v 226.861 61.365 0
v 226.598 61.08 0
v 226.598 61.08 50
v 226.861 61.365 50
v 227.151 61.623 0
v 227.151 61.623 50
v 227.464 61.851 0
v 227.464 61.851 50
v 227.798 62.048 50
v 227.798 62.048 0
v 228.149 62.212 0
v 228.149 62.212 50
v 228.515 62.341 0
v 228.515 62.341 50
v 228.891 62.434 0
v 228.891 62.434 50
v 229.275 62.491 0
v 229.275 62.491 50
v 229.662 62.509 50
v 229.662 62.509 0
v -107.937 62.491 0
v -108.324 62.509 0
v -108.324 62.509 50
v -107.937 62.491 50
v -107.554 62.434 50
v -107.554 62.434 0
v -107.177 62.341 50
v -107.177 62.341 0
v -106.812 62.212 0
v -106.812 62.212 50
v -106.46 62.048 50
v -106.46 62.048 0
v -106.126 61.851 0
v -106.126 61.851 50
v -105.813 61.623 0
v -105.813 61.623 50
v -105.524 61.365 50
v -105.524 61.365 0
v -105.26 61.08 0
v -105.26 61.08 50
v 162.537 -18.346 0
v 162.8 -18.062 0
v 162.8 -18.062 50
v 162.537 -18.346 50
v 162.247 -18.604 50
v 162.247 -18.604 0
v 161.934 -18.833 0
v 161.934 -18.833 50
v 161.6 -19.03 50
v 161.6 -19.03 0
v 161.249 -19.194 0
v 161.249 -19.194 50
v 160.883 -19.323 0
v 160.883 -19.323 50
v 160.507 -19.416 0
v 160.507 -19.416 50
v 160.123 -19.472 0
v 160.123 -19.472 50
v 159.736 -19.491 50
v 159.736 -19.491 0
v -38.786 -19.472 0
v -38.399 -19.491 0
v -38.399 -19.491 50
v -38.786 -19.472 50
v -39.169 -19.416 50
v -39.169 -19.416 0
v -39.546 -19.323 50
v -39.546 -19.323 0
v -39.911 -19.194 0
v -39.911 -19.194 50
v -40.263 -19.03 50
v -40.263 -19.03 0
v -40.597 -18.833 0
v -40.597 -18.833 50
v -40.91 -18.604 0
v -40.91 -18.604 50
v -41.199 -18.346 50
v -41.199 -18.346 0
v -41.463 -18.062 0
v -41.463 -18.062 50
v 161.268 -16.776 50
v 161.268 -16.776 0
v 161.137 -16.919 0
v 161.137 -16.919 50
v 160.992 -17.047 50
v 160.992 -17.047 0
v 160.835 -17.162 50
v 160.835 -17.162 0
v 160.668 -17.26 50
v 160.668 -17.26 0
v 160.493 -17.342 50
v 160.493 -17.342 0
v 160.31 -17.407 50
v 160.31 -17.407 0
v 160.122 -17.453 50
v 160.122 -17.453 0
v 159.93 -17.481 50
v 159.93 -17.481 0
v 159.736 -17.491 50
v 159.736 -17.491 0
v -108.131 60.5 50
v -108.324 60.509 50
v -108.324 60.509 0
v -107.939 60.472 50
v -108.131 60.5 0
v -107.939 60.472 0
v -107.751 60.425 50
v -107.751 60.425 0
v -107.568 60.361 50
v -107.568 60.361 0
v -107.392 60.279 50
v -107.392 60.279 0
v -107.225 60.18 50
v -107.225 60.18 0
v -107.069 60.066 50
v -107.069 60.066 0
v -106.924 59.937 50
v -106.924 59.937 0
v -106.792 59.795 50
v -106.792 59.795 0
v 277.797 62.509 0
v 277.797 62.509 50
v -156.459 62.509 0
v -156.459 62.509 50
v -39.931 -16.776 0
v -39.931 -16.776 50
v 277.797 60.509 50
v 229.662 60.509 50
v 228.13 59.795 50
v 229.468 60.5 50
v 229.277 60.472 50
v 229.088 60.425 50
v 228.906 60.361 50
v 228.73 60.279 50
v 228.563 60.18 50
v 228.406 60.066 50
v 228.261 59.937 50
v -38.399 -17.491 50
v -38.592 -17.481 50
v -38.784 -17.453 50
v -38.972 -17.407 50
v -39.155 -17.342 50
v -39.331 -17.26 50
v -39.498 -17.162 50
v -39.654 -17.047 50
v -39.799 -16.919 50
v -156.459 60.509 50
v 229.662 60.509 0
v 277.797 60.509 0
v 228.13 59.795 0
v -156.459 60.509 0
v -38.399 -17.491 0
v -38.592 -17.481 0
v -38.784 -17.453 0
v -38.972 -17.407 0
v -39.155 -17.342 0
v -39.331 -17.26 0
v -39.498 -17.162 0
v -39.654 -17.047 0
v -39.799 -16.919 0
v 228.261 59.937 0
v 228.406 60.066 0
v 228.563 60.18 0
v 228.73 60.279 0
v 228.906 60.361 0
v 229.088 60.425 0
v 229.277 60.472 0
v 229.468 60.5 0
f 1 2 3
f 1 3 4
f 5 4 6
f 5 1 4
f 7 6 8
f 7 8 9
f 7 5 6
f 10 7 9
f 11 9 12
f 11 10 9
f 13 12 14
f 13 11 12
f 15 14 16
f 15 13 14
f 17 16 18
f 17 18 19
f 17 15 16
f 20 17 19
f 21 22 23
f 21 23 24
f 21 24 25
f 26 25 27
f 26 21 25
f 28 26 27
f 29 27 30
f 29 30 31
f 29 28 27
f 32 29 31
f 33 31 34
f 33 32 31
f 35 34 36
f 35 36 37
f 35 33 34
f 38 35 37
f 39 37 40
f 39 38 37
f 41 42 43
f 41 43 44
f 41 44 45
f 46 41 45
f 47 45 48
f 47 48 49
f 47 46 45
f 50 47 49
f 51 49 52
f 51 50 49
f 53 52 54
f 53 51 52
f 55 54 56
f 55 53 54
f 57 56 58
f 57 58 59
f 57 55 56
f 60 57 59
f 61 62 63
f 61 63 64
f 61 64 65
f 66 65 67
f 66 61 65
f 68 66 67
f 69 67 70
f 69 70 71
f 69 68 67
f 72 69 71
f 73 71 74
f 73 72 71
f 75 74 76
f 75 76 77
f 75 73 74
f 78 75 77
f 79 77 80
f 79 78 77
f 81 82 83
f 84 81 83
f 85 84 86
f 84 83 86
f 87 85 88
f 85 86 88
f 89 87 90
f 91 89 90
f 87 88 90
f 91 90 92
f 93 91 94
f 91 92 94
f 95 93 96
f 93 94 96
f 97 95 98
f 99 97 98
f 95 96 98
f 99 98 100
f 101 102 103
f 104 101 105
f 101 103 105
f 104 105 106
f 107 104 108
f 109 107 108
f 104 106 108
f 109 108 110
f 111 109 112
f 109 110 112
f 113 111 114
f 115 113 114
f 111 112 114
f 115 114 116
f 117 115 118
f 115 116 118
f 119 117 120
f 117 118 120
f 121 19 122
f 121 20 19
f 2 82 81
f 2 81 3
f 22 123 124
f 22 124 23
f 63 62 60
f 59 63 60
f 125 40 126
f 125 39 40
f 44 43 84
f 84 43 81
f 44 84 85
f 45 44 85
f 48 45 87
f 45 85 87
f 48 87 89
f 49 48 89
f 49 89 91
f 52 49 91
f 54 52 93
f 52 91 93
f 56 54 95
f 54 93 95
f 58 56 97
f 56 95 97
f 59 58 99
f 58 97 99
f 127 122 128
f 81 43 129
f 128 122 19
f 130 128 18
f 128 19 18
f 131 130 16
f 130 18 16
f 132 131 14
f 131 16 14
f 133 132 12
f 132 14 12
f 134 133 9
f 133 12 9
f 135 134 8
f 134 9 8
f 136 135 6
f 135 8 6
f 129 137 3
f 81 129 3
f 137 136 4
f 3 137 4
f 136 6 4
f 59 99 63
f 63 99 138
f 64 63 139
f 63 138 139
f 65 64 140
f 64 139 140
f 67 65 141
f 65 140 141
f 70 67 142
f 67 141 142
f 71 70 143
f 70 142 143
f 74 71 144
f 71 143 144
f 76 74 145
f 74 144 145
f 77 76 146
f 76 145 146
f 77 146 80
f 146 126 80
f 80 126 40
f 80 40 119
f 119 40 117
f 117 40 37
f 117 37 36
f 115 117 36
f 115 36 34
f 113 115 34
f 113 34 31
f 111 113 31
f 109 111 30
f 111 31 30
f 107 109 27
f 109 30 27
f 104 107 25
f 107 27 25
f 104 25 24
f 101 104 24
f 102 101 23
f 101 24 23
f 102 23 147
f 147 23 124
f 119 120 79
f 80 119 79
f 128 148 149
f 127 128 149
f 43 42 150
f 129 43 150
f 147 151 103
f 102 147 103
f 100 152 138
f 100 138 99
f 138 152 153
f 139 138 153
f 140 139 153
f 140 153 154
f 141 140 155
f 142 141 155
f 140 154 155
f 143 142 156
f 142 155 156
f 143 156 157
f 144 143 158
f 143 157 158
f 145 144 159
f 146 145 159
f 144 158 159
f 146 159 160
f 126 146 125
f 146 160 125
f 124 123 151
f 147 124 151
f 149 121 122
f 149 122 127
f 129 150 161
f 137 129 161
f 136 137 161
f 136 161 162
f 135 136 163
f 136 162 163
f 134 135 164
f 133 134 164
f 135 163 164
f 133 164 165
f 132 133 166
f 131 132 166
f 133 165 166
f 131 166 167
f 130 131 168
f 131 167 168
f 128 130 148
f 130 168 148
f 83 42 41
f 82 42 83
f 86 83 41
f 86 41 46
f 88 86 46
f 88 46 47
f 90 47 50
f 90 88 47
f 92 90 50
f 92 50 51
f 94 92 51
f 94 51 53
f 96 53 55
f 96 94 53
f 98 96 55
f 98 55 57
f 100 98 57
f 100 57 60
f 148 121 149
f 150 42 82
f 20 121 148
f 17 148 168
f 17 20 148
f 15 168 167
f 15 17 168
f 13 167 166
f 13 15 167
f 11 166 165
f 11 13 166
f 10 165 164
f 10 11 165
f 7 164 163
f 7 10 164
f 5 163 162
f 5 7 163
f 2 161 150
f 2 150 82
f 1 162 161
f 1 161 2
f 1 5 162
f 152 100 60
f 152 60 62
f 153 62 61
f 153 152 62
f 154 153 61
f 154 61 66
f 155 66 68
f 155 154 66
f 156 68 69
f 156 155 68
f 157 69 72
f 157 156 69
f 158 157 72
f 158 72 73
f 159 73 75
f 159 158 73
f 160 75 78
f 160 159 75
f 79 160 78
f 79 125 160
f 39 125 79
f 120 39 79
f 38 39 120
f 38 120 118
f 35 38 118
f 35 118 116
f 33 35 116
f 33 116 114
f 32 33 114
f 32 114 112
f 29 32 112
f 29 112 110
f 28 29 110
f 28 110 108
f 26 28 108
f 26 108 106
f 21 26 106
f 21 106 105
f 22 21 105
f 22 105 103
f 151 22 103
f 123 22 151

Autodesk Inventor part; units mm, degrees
ref_plane "YZ Plane" through (0, 0, 0) normal (1, 0, 0) x (0, 1, 0)
ref_plane "XZ Plane" through (0, 0, 0) normal (0, 1, 0) x (-1, 0, 0)
ref_plane "XY Plane" through (0, 0, 0) normal (0, 0, 1) x (1, 0, 0)
sketch "Sketch3" plane through (0, 0, 0) normal (0, 0, 1) x (1, 0, 0)
  line L0 (-156.4592, 62.5093) -> (-106.4592, 62.5093)
  line L1 (-106.4592, 62.5093) -> (-39.3312, -17.4907)
  line L2 (-39.3312, -17.4907) -> (160.6688, -17.4907)
  line L3 (160.6688, -17.4907) -> (227.7967, 62.5093)
  line L4 (227.7967, 62.5093) -> (277.7967, 62.5093)
  point P0 (0, 0)
  dimension "d0" = 50
  dimension "d1" = 50
  dimension "d2" = 200
  dimension "d3" = 130
  dimension "d4" = 130
  dimension "d5" = 80
contour flange "Contour Flange1" sketch "Sketch3" thickness 2 bend radius 2 width 50 along (0, 0, 1) mid plane no both sides no wall seen from (-131.4592, 62.5093, 0) lies toward (0, -1, 0) curves L0 L1 L2 L3 L4
bend "Bend1"
corner "Corner1"
equation "\"d4\" = d3"
equation "\"d6\" = BendReliefWidth"
equation "\"d7\" = BendReliefDepth"
equation "\"d8\" = MinimumRemnant"
equation "\"d9\" = BendRadius"
equation "\"d11\" = BendRadius"
equation "\"d13\" = CornerReliefSize"
equation "\"d14\" = GapSize"
equation "\"d15\" = JacobiRadiusSize"
equation "\"BendRadius\" = Thickness"
equation "\"BendReliefWidth\" = Thickness"
equation "\"BendReliefDepth\" = 0.5 * Thickness"
equation "\"CornerReliefSize\" = 4 * Thickness"
equation "\"MinimumRemnant\" = 2 * Thickness"
equation "\"TransitionRadius\" = BendRadius"
equation "\"JacobiRadiusSize\" = BendRadius"
equation "\"GapSize\" = Thickness"
equation "\"Thickness\" = 2"
properties part number "handle"
